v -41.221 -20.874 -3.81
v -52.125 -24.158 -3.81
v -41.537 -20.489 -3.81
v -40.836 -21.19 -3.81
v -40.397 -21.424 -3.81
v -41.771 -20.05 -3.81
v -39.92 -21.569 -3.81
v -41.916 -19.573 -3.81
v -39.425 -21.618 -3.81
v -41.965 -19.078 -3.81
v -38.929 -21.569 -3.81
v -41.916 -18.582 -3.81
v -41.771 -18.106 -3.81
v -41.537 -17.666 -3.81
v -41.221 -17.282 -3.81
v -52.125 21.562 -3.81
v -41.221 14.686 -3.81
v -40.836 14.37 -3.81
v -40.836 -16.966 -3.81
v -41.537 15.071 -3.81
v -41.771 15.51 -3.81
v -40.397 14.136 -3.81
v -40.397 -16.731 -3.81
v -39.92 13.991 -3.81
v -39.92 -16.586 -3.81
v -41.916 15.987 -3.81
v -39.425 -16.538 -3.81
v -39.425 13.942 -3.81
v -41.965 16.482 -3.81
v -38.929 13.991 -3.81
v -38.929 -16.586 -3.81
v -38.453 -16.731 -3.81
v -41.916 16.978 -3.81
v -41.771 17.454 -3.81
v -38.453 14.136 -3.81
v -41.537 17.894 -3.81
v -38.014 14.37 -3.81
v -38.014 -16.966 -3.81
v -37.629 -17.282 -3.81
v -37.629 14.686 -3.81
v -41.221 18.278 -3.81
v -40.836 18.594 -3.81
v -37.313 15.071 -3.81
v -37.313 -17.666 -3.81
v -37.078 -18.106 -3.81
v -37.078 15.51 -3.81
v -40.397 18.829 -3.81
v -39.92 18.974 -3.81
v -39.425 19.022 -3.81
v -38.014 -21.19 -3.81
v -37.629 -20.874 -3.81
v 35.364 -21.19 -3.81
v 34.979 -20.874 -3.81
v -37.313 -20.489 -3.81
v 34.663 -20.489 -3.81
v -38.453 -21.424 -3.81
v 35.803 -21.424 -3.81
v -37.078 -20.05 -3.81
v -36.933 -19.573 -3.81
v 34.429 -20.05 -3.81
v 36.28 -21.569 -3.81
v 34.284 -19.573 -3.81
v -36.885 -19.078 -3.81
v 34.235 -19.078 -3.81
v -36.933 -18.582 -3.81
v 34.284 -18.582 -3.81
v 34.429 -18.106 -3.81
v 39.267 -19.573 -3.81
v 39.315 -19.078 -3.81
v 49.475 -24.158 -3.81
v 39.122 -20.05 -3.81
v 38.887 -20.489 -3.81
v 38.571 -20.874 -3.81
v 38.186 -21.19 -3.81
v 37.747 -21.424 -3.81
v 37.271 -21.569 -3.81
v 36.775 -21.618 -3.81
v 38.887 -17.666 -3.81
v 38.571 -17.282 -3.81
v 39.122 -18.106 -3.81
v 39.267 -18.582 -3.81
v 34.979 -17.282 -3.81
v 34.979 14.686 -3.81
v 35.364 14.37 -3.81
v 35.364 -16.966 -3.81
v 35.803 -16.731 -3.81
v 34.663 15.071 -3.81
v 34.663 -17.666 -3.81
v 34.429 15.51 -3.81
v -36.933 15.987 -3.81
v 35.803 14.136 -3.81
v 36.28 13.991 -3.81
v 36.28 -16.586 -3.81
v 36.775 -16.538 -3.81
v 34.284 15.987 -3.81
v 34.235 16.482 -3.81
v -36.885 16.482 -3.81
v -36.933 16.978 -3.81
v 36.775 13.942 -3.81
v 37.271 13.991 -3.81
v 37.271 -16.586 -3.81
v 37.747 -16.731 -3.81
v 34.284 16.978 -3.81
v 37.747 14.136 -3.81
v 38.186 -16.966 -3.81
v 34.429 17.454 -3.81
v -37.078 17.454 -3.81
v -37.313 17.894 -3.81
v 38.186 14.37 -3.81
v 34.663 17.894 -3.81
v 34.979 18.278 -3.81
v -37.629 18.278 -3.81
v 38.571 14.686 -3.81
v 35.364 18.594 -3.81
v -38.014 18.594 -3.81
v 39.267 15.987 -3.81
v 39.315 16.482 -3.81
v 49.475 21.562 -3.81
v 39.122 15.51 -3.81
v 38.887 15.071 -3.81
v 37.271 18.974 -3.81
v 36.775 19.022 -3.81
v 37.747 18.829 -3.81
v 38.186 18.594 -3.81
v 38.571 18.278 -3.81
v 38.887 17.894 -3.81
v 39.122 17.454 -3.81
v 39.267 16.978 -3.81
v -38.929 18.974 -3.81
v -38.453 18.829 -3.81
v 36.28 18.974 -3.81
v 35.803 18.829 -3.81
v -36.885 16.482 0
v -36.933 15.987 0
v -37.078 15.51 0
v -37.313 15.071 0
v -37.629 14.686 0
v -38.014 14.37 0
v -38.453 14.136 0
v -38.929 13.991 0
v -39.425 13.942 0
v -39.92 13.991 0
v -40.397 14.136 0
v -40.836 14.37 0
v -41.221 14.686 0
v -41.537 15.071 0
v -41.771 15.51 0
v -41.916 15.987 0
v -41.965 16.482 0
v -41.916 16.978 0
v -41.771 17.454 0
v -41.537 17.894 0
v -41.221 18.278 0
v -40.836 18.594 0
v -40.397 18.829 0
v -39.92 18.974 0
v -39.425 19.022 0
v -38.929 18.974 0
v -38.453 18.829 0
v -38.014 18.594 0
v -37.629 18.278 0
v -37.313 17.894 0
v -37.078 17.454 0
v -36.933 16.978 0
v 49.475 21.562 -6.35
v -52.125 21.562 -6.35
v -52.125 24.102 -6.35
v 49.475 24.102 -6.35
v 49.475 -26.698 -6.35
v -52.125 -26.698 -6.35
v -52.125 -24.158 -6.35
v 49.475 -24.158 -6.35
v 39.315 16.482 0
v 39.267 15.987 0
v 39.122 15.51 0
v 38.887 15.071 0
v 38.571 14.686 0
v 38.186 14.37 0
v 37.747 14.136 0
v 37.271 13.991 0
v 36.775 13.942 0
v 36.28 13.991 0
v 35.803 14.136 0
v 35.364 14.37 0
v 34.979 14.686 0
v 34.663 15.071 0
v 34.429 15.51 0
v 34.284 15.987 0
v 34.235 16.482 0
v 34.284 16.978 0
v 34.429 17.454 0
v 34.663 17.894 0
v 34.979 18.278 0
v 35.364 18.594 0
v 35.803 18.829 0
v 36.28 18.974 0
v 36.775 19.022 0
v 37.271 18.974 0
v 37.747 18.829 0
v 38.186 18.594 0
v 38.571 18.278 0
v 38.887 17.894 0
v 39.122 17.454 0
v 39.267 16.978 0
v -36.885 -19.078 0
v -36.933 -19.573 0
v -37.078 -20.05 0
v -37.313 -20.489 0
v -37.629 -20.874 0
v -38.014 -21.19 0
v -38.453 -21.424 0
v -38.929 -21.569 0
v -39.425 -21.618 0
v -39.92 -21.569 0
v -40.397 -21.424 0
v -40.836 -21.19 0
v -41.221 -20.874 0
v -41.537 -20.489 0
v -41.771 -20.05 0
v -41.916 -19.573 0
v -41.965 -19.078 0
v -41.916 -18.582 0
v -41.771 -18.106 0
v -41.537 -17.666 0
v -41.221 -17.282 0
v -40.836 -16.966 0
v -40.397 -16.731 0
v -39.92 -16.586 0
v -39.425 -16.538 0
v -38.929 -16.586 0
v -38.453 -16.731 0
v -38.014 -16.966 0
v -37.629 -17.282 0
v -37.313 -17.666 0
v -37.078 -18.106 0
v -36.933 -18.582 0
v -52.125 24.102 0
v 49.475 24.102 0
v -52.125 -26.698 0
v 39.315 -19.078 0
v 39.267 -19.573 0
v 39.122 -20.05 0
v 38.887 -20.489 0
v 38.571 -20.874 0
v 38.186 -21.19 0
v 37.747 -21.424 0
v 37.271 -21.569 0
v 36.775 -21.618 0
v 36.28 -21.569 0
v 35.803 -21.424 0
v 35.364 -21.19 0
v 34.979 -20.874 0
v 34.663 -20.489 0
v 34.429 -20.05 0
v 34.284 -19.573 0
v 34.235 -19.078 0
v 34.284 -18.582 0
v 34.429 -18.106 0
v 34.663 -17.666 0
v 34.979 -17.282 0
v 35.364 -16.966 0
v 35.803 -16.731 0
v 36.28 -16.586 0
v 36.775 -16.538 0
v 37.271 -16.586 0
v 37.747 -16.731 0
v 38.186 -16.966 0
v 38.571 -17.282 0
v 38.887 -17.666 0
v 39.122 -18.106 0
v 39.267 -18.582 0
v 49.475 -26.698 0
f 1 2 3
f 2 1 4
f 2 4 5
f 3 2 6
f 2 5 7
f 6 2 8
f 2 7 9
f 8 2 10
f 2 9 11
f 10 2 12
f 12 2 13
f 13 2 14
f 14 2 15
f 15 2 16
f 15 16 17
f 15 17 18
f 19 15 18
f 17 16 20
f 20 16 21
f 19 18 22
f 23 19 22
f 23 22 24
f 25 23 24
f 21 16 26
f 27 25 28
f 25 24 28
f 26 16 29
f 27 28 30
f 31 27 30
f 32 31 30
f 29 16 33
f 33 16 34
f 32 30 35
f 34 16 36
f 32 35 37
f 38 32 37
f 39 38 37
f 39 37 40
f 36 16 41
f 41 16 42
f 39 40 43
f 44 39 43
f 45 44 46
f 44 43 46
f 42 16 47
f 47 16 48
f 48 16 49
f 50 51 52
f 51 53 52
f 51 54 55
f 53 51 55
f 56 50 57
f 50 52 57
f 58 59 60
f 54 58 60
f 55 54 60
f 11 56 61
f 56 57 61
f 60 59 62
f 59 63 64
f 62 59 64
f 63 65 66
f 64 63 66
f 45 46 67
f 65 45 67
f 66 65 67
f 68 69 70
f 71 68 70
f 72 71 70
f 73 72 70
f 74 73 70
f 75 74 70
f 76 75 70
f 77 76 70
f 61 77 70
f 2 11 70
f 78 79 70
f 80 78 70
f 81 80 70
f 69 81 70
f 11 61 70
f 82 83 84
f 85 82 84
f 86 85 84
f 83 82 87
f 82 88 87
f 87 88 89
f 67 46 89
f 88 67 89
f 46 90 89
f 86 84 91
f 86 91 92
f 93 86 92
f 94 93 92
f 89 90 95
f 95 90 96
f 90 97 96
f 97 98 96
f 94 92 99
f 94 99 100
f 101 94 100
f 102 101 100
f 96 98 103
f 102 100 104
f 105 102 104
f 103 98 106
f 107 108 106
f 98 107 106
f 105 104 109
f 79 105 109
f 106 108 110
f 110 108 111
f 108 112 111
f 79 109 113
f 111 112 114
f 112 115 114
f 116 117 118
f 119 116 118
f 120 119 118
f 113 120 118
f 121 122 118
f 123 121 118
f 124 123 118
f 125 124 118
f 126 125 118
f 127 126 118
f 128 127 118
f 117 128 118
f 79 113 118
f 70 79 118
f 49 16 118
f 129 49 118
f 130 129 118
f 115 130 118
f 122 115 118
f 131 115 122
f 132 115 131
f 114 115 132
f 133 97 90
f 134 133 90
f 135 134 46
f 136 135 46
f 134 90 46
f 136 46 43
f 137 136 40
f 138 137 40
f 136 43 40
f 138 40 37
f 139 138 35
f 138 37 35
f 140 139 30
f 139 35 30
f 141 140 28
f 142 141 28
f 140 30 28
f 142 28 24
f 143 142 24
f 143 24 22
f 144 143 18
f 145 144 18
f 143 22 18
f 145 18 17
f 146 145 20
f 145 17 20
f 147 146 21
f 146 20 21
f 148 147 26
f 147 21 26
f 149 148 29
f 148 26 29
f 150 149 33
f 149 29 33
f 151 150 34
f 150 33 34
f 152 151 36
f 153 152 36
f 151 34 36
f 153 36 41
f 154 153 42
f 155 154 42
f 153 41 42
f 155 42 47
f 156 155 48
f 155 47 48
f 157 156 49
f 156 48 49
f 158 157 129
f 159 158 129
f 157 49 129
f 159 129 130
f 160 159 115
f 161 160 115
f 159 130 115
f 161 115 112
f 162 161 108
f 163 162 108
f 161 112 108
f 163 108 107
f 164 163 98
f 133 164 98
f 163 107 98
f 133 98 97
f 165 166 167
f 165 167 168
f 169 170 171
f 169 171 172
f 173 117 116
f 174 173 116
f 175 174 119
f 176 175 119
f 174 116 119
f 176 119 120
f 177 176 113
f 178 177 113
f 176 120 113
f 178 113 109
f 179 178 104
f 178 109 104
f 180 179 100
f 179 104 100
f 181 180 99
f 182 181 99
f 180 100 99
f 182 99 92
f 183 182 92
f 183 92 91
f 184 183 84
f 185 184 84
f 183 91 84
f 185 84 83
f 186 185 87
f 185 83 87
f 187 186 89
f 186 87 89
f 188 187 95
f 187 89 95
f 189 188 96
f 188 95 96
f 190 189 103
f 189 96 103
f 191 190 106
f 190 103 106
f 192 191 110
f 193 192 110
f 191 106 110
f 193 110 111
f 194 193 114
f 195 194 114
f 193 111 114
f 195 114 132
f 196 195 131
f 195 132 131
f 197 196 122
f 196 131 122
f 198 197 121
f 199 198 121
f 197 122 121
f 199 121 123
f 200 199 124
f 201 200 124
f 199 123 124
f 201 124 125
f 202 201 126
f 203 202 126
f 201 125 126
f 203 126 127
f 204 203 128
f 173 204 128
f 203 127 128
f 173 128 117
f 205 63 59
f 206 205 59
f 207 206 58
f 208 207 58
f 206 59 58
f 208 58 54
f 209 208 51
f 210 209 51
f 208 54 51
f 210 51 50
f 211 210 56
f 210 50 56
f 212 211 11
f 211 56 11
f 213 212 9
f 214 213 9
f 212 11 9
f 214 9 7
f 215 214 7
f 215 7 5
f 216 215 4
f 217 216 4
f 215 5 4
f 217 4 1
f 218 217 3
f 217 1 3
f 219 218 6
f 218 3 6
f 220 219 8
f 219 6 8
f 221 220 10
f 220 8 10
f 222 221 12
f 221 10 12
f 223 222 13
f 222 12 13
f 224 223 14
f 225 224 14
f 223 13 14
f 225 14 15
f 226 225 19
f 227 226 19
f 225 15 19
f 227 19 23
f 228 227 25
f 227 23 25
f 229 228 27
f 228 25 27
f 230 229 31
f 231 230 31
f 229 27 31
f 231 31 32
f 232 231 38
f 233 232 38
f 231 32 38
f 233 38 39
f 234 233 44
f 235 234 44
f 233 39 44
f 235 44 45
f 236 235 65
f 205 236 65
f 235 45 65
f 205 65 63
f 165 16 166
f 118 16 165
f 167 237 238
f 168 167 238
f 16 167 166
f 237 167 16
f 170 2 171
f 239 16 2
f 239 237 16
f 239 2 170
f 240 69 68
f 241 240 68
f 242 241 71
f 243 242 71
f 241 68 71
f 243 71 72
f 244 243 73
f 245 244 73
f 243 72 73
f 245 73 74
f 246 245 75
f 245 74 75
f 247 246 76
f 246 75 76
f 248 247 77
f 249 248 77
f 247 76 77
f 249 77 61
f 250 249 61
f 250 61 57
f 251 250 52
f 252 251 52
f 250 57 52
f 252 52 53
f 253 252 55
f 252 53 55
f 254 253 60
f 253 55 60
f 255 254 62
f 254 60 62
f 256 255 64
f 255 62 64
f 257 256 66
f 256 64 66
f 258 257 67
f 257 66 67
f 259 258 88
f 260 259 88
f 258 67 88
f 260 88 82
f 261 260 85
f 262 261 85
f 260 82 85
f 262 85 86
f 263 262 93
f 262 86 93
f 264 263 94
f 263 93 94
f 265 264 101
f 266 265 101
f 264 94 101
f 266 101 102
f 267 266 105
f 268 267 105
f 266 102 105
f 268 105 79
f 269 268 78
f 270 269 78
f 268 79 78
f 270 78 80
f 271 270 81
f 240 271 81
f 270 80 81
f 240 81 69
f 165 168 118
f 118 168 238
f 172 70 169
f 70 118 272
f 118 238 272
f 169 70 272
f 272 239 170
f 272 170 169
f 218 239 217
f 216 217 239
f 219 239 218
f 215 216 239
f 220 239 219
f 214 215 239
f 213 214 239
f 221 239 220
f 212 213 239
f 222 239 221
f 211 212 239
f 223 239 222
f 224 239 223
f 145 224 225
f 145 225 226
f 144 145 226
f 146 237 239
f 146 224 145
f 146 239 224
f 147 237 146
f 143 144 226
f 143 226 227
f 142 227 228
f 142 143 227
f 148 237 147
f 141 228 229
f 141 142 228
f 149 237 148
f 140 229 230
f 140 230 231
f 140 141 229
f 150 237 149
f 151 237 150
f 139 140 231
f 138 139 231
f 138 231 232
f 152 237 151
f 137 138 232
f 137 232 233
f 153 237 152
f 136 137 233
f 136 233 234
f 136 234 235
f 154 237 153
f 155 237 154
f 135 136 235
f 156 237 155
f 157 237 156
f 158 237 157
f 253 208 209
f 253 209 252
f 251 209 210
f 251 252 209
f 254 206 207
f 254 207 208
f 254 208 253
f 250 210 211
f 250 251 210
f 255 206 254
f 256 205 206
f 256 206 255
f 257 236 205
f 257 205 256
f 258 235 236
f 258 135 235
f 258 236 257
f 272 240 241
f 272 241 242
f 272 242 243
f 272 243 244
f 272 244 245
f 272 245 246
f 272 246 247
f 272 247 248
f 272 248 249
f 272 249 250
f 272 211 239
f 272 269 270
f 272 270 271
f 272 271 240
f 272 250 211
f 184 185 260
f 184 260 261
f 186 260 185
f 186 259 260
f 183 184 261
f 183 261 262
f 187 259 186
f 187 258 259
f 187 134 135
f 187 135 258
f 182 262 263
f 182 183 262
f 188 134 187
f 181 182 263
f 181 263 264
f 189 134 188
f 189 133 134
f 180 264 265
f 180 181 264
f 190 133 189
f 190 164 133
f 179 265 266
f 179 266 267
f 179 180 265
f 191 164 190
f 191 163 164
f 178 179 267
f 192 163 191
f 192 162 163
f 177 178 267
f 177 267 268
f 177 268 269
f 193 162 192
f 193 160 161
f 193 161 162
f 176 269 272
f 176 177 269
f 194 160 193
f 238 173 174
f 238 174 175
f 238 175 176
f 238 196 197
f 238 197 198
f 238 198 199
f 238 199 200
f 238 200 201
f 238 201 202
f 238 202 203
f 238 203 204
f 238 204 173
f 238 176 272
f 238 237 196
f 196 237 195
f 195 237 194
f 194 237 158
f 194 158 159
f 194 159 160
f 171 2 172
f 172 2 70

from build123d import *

# Parameters (mm, degrees)
F0_W     = 101.6
F0_H     = 50.8
F1_DEPTH = 3.81
F2_W     = 101.6
F2_H     = 2.54
F3_DEPTH = 2.54
F4_R     = 2.54
F5_DEPTH = 3.81


with BuildPart() as f1:
    # F0 (on Top) → F1 (new body)
    with BuildSketch(Plane.XY):
        with Locations((-1.324669, -1.297615)):
            Rectangle(F0_W, F0_H)
    extrude(amount=-F1_DEPTH)

    # F2 (on face) → F3 (join)
    with BuildSketch(Plane(origin=(0, 0, -3.81), x_dir=(1, 0, 0), z_dir=(0, 0, -1))):
        with Locations((-1.324669, 25.427615)):
            Rectangle(F2_W, F2_H)
        with Locations((-1.324669, -22.832385)):
            Rectangle(F2_W, F2_H)
    extrude(amount=F3_DEPTH)

    # F4 (on face) → F5 (cut)
    with BuildSketch(Plane(origin=(0, 0, -3.81), x_dir=(1, 0, 0), z_dir=(0, 0, -1))):
        with Locations((-39.424669, 19.077615)):
            Circle(F4_R)
        with Locations((-39.424669, -16.482385)):
            Circle(F4_R)
        with Locations((36.775331, 19.077615)):
            Circle(F4_R)
        with Locations((36.775331, -16.482385)):
            Circle(F4_R)
    extrude(amount=-F5_DEPTH, mode=Mode.SUBTRACT)


solid = f1.part
